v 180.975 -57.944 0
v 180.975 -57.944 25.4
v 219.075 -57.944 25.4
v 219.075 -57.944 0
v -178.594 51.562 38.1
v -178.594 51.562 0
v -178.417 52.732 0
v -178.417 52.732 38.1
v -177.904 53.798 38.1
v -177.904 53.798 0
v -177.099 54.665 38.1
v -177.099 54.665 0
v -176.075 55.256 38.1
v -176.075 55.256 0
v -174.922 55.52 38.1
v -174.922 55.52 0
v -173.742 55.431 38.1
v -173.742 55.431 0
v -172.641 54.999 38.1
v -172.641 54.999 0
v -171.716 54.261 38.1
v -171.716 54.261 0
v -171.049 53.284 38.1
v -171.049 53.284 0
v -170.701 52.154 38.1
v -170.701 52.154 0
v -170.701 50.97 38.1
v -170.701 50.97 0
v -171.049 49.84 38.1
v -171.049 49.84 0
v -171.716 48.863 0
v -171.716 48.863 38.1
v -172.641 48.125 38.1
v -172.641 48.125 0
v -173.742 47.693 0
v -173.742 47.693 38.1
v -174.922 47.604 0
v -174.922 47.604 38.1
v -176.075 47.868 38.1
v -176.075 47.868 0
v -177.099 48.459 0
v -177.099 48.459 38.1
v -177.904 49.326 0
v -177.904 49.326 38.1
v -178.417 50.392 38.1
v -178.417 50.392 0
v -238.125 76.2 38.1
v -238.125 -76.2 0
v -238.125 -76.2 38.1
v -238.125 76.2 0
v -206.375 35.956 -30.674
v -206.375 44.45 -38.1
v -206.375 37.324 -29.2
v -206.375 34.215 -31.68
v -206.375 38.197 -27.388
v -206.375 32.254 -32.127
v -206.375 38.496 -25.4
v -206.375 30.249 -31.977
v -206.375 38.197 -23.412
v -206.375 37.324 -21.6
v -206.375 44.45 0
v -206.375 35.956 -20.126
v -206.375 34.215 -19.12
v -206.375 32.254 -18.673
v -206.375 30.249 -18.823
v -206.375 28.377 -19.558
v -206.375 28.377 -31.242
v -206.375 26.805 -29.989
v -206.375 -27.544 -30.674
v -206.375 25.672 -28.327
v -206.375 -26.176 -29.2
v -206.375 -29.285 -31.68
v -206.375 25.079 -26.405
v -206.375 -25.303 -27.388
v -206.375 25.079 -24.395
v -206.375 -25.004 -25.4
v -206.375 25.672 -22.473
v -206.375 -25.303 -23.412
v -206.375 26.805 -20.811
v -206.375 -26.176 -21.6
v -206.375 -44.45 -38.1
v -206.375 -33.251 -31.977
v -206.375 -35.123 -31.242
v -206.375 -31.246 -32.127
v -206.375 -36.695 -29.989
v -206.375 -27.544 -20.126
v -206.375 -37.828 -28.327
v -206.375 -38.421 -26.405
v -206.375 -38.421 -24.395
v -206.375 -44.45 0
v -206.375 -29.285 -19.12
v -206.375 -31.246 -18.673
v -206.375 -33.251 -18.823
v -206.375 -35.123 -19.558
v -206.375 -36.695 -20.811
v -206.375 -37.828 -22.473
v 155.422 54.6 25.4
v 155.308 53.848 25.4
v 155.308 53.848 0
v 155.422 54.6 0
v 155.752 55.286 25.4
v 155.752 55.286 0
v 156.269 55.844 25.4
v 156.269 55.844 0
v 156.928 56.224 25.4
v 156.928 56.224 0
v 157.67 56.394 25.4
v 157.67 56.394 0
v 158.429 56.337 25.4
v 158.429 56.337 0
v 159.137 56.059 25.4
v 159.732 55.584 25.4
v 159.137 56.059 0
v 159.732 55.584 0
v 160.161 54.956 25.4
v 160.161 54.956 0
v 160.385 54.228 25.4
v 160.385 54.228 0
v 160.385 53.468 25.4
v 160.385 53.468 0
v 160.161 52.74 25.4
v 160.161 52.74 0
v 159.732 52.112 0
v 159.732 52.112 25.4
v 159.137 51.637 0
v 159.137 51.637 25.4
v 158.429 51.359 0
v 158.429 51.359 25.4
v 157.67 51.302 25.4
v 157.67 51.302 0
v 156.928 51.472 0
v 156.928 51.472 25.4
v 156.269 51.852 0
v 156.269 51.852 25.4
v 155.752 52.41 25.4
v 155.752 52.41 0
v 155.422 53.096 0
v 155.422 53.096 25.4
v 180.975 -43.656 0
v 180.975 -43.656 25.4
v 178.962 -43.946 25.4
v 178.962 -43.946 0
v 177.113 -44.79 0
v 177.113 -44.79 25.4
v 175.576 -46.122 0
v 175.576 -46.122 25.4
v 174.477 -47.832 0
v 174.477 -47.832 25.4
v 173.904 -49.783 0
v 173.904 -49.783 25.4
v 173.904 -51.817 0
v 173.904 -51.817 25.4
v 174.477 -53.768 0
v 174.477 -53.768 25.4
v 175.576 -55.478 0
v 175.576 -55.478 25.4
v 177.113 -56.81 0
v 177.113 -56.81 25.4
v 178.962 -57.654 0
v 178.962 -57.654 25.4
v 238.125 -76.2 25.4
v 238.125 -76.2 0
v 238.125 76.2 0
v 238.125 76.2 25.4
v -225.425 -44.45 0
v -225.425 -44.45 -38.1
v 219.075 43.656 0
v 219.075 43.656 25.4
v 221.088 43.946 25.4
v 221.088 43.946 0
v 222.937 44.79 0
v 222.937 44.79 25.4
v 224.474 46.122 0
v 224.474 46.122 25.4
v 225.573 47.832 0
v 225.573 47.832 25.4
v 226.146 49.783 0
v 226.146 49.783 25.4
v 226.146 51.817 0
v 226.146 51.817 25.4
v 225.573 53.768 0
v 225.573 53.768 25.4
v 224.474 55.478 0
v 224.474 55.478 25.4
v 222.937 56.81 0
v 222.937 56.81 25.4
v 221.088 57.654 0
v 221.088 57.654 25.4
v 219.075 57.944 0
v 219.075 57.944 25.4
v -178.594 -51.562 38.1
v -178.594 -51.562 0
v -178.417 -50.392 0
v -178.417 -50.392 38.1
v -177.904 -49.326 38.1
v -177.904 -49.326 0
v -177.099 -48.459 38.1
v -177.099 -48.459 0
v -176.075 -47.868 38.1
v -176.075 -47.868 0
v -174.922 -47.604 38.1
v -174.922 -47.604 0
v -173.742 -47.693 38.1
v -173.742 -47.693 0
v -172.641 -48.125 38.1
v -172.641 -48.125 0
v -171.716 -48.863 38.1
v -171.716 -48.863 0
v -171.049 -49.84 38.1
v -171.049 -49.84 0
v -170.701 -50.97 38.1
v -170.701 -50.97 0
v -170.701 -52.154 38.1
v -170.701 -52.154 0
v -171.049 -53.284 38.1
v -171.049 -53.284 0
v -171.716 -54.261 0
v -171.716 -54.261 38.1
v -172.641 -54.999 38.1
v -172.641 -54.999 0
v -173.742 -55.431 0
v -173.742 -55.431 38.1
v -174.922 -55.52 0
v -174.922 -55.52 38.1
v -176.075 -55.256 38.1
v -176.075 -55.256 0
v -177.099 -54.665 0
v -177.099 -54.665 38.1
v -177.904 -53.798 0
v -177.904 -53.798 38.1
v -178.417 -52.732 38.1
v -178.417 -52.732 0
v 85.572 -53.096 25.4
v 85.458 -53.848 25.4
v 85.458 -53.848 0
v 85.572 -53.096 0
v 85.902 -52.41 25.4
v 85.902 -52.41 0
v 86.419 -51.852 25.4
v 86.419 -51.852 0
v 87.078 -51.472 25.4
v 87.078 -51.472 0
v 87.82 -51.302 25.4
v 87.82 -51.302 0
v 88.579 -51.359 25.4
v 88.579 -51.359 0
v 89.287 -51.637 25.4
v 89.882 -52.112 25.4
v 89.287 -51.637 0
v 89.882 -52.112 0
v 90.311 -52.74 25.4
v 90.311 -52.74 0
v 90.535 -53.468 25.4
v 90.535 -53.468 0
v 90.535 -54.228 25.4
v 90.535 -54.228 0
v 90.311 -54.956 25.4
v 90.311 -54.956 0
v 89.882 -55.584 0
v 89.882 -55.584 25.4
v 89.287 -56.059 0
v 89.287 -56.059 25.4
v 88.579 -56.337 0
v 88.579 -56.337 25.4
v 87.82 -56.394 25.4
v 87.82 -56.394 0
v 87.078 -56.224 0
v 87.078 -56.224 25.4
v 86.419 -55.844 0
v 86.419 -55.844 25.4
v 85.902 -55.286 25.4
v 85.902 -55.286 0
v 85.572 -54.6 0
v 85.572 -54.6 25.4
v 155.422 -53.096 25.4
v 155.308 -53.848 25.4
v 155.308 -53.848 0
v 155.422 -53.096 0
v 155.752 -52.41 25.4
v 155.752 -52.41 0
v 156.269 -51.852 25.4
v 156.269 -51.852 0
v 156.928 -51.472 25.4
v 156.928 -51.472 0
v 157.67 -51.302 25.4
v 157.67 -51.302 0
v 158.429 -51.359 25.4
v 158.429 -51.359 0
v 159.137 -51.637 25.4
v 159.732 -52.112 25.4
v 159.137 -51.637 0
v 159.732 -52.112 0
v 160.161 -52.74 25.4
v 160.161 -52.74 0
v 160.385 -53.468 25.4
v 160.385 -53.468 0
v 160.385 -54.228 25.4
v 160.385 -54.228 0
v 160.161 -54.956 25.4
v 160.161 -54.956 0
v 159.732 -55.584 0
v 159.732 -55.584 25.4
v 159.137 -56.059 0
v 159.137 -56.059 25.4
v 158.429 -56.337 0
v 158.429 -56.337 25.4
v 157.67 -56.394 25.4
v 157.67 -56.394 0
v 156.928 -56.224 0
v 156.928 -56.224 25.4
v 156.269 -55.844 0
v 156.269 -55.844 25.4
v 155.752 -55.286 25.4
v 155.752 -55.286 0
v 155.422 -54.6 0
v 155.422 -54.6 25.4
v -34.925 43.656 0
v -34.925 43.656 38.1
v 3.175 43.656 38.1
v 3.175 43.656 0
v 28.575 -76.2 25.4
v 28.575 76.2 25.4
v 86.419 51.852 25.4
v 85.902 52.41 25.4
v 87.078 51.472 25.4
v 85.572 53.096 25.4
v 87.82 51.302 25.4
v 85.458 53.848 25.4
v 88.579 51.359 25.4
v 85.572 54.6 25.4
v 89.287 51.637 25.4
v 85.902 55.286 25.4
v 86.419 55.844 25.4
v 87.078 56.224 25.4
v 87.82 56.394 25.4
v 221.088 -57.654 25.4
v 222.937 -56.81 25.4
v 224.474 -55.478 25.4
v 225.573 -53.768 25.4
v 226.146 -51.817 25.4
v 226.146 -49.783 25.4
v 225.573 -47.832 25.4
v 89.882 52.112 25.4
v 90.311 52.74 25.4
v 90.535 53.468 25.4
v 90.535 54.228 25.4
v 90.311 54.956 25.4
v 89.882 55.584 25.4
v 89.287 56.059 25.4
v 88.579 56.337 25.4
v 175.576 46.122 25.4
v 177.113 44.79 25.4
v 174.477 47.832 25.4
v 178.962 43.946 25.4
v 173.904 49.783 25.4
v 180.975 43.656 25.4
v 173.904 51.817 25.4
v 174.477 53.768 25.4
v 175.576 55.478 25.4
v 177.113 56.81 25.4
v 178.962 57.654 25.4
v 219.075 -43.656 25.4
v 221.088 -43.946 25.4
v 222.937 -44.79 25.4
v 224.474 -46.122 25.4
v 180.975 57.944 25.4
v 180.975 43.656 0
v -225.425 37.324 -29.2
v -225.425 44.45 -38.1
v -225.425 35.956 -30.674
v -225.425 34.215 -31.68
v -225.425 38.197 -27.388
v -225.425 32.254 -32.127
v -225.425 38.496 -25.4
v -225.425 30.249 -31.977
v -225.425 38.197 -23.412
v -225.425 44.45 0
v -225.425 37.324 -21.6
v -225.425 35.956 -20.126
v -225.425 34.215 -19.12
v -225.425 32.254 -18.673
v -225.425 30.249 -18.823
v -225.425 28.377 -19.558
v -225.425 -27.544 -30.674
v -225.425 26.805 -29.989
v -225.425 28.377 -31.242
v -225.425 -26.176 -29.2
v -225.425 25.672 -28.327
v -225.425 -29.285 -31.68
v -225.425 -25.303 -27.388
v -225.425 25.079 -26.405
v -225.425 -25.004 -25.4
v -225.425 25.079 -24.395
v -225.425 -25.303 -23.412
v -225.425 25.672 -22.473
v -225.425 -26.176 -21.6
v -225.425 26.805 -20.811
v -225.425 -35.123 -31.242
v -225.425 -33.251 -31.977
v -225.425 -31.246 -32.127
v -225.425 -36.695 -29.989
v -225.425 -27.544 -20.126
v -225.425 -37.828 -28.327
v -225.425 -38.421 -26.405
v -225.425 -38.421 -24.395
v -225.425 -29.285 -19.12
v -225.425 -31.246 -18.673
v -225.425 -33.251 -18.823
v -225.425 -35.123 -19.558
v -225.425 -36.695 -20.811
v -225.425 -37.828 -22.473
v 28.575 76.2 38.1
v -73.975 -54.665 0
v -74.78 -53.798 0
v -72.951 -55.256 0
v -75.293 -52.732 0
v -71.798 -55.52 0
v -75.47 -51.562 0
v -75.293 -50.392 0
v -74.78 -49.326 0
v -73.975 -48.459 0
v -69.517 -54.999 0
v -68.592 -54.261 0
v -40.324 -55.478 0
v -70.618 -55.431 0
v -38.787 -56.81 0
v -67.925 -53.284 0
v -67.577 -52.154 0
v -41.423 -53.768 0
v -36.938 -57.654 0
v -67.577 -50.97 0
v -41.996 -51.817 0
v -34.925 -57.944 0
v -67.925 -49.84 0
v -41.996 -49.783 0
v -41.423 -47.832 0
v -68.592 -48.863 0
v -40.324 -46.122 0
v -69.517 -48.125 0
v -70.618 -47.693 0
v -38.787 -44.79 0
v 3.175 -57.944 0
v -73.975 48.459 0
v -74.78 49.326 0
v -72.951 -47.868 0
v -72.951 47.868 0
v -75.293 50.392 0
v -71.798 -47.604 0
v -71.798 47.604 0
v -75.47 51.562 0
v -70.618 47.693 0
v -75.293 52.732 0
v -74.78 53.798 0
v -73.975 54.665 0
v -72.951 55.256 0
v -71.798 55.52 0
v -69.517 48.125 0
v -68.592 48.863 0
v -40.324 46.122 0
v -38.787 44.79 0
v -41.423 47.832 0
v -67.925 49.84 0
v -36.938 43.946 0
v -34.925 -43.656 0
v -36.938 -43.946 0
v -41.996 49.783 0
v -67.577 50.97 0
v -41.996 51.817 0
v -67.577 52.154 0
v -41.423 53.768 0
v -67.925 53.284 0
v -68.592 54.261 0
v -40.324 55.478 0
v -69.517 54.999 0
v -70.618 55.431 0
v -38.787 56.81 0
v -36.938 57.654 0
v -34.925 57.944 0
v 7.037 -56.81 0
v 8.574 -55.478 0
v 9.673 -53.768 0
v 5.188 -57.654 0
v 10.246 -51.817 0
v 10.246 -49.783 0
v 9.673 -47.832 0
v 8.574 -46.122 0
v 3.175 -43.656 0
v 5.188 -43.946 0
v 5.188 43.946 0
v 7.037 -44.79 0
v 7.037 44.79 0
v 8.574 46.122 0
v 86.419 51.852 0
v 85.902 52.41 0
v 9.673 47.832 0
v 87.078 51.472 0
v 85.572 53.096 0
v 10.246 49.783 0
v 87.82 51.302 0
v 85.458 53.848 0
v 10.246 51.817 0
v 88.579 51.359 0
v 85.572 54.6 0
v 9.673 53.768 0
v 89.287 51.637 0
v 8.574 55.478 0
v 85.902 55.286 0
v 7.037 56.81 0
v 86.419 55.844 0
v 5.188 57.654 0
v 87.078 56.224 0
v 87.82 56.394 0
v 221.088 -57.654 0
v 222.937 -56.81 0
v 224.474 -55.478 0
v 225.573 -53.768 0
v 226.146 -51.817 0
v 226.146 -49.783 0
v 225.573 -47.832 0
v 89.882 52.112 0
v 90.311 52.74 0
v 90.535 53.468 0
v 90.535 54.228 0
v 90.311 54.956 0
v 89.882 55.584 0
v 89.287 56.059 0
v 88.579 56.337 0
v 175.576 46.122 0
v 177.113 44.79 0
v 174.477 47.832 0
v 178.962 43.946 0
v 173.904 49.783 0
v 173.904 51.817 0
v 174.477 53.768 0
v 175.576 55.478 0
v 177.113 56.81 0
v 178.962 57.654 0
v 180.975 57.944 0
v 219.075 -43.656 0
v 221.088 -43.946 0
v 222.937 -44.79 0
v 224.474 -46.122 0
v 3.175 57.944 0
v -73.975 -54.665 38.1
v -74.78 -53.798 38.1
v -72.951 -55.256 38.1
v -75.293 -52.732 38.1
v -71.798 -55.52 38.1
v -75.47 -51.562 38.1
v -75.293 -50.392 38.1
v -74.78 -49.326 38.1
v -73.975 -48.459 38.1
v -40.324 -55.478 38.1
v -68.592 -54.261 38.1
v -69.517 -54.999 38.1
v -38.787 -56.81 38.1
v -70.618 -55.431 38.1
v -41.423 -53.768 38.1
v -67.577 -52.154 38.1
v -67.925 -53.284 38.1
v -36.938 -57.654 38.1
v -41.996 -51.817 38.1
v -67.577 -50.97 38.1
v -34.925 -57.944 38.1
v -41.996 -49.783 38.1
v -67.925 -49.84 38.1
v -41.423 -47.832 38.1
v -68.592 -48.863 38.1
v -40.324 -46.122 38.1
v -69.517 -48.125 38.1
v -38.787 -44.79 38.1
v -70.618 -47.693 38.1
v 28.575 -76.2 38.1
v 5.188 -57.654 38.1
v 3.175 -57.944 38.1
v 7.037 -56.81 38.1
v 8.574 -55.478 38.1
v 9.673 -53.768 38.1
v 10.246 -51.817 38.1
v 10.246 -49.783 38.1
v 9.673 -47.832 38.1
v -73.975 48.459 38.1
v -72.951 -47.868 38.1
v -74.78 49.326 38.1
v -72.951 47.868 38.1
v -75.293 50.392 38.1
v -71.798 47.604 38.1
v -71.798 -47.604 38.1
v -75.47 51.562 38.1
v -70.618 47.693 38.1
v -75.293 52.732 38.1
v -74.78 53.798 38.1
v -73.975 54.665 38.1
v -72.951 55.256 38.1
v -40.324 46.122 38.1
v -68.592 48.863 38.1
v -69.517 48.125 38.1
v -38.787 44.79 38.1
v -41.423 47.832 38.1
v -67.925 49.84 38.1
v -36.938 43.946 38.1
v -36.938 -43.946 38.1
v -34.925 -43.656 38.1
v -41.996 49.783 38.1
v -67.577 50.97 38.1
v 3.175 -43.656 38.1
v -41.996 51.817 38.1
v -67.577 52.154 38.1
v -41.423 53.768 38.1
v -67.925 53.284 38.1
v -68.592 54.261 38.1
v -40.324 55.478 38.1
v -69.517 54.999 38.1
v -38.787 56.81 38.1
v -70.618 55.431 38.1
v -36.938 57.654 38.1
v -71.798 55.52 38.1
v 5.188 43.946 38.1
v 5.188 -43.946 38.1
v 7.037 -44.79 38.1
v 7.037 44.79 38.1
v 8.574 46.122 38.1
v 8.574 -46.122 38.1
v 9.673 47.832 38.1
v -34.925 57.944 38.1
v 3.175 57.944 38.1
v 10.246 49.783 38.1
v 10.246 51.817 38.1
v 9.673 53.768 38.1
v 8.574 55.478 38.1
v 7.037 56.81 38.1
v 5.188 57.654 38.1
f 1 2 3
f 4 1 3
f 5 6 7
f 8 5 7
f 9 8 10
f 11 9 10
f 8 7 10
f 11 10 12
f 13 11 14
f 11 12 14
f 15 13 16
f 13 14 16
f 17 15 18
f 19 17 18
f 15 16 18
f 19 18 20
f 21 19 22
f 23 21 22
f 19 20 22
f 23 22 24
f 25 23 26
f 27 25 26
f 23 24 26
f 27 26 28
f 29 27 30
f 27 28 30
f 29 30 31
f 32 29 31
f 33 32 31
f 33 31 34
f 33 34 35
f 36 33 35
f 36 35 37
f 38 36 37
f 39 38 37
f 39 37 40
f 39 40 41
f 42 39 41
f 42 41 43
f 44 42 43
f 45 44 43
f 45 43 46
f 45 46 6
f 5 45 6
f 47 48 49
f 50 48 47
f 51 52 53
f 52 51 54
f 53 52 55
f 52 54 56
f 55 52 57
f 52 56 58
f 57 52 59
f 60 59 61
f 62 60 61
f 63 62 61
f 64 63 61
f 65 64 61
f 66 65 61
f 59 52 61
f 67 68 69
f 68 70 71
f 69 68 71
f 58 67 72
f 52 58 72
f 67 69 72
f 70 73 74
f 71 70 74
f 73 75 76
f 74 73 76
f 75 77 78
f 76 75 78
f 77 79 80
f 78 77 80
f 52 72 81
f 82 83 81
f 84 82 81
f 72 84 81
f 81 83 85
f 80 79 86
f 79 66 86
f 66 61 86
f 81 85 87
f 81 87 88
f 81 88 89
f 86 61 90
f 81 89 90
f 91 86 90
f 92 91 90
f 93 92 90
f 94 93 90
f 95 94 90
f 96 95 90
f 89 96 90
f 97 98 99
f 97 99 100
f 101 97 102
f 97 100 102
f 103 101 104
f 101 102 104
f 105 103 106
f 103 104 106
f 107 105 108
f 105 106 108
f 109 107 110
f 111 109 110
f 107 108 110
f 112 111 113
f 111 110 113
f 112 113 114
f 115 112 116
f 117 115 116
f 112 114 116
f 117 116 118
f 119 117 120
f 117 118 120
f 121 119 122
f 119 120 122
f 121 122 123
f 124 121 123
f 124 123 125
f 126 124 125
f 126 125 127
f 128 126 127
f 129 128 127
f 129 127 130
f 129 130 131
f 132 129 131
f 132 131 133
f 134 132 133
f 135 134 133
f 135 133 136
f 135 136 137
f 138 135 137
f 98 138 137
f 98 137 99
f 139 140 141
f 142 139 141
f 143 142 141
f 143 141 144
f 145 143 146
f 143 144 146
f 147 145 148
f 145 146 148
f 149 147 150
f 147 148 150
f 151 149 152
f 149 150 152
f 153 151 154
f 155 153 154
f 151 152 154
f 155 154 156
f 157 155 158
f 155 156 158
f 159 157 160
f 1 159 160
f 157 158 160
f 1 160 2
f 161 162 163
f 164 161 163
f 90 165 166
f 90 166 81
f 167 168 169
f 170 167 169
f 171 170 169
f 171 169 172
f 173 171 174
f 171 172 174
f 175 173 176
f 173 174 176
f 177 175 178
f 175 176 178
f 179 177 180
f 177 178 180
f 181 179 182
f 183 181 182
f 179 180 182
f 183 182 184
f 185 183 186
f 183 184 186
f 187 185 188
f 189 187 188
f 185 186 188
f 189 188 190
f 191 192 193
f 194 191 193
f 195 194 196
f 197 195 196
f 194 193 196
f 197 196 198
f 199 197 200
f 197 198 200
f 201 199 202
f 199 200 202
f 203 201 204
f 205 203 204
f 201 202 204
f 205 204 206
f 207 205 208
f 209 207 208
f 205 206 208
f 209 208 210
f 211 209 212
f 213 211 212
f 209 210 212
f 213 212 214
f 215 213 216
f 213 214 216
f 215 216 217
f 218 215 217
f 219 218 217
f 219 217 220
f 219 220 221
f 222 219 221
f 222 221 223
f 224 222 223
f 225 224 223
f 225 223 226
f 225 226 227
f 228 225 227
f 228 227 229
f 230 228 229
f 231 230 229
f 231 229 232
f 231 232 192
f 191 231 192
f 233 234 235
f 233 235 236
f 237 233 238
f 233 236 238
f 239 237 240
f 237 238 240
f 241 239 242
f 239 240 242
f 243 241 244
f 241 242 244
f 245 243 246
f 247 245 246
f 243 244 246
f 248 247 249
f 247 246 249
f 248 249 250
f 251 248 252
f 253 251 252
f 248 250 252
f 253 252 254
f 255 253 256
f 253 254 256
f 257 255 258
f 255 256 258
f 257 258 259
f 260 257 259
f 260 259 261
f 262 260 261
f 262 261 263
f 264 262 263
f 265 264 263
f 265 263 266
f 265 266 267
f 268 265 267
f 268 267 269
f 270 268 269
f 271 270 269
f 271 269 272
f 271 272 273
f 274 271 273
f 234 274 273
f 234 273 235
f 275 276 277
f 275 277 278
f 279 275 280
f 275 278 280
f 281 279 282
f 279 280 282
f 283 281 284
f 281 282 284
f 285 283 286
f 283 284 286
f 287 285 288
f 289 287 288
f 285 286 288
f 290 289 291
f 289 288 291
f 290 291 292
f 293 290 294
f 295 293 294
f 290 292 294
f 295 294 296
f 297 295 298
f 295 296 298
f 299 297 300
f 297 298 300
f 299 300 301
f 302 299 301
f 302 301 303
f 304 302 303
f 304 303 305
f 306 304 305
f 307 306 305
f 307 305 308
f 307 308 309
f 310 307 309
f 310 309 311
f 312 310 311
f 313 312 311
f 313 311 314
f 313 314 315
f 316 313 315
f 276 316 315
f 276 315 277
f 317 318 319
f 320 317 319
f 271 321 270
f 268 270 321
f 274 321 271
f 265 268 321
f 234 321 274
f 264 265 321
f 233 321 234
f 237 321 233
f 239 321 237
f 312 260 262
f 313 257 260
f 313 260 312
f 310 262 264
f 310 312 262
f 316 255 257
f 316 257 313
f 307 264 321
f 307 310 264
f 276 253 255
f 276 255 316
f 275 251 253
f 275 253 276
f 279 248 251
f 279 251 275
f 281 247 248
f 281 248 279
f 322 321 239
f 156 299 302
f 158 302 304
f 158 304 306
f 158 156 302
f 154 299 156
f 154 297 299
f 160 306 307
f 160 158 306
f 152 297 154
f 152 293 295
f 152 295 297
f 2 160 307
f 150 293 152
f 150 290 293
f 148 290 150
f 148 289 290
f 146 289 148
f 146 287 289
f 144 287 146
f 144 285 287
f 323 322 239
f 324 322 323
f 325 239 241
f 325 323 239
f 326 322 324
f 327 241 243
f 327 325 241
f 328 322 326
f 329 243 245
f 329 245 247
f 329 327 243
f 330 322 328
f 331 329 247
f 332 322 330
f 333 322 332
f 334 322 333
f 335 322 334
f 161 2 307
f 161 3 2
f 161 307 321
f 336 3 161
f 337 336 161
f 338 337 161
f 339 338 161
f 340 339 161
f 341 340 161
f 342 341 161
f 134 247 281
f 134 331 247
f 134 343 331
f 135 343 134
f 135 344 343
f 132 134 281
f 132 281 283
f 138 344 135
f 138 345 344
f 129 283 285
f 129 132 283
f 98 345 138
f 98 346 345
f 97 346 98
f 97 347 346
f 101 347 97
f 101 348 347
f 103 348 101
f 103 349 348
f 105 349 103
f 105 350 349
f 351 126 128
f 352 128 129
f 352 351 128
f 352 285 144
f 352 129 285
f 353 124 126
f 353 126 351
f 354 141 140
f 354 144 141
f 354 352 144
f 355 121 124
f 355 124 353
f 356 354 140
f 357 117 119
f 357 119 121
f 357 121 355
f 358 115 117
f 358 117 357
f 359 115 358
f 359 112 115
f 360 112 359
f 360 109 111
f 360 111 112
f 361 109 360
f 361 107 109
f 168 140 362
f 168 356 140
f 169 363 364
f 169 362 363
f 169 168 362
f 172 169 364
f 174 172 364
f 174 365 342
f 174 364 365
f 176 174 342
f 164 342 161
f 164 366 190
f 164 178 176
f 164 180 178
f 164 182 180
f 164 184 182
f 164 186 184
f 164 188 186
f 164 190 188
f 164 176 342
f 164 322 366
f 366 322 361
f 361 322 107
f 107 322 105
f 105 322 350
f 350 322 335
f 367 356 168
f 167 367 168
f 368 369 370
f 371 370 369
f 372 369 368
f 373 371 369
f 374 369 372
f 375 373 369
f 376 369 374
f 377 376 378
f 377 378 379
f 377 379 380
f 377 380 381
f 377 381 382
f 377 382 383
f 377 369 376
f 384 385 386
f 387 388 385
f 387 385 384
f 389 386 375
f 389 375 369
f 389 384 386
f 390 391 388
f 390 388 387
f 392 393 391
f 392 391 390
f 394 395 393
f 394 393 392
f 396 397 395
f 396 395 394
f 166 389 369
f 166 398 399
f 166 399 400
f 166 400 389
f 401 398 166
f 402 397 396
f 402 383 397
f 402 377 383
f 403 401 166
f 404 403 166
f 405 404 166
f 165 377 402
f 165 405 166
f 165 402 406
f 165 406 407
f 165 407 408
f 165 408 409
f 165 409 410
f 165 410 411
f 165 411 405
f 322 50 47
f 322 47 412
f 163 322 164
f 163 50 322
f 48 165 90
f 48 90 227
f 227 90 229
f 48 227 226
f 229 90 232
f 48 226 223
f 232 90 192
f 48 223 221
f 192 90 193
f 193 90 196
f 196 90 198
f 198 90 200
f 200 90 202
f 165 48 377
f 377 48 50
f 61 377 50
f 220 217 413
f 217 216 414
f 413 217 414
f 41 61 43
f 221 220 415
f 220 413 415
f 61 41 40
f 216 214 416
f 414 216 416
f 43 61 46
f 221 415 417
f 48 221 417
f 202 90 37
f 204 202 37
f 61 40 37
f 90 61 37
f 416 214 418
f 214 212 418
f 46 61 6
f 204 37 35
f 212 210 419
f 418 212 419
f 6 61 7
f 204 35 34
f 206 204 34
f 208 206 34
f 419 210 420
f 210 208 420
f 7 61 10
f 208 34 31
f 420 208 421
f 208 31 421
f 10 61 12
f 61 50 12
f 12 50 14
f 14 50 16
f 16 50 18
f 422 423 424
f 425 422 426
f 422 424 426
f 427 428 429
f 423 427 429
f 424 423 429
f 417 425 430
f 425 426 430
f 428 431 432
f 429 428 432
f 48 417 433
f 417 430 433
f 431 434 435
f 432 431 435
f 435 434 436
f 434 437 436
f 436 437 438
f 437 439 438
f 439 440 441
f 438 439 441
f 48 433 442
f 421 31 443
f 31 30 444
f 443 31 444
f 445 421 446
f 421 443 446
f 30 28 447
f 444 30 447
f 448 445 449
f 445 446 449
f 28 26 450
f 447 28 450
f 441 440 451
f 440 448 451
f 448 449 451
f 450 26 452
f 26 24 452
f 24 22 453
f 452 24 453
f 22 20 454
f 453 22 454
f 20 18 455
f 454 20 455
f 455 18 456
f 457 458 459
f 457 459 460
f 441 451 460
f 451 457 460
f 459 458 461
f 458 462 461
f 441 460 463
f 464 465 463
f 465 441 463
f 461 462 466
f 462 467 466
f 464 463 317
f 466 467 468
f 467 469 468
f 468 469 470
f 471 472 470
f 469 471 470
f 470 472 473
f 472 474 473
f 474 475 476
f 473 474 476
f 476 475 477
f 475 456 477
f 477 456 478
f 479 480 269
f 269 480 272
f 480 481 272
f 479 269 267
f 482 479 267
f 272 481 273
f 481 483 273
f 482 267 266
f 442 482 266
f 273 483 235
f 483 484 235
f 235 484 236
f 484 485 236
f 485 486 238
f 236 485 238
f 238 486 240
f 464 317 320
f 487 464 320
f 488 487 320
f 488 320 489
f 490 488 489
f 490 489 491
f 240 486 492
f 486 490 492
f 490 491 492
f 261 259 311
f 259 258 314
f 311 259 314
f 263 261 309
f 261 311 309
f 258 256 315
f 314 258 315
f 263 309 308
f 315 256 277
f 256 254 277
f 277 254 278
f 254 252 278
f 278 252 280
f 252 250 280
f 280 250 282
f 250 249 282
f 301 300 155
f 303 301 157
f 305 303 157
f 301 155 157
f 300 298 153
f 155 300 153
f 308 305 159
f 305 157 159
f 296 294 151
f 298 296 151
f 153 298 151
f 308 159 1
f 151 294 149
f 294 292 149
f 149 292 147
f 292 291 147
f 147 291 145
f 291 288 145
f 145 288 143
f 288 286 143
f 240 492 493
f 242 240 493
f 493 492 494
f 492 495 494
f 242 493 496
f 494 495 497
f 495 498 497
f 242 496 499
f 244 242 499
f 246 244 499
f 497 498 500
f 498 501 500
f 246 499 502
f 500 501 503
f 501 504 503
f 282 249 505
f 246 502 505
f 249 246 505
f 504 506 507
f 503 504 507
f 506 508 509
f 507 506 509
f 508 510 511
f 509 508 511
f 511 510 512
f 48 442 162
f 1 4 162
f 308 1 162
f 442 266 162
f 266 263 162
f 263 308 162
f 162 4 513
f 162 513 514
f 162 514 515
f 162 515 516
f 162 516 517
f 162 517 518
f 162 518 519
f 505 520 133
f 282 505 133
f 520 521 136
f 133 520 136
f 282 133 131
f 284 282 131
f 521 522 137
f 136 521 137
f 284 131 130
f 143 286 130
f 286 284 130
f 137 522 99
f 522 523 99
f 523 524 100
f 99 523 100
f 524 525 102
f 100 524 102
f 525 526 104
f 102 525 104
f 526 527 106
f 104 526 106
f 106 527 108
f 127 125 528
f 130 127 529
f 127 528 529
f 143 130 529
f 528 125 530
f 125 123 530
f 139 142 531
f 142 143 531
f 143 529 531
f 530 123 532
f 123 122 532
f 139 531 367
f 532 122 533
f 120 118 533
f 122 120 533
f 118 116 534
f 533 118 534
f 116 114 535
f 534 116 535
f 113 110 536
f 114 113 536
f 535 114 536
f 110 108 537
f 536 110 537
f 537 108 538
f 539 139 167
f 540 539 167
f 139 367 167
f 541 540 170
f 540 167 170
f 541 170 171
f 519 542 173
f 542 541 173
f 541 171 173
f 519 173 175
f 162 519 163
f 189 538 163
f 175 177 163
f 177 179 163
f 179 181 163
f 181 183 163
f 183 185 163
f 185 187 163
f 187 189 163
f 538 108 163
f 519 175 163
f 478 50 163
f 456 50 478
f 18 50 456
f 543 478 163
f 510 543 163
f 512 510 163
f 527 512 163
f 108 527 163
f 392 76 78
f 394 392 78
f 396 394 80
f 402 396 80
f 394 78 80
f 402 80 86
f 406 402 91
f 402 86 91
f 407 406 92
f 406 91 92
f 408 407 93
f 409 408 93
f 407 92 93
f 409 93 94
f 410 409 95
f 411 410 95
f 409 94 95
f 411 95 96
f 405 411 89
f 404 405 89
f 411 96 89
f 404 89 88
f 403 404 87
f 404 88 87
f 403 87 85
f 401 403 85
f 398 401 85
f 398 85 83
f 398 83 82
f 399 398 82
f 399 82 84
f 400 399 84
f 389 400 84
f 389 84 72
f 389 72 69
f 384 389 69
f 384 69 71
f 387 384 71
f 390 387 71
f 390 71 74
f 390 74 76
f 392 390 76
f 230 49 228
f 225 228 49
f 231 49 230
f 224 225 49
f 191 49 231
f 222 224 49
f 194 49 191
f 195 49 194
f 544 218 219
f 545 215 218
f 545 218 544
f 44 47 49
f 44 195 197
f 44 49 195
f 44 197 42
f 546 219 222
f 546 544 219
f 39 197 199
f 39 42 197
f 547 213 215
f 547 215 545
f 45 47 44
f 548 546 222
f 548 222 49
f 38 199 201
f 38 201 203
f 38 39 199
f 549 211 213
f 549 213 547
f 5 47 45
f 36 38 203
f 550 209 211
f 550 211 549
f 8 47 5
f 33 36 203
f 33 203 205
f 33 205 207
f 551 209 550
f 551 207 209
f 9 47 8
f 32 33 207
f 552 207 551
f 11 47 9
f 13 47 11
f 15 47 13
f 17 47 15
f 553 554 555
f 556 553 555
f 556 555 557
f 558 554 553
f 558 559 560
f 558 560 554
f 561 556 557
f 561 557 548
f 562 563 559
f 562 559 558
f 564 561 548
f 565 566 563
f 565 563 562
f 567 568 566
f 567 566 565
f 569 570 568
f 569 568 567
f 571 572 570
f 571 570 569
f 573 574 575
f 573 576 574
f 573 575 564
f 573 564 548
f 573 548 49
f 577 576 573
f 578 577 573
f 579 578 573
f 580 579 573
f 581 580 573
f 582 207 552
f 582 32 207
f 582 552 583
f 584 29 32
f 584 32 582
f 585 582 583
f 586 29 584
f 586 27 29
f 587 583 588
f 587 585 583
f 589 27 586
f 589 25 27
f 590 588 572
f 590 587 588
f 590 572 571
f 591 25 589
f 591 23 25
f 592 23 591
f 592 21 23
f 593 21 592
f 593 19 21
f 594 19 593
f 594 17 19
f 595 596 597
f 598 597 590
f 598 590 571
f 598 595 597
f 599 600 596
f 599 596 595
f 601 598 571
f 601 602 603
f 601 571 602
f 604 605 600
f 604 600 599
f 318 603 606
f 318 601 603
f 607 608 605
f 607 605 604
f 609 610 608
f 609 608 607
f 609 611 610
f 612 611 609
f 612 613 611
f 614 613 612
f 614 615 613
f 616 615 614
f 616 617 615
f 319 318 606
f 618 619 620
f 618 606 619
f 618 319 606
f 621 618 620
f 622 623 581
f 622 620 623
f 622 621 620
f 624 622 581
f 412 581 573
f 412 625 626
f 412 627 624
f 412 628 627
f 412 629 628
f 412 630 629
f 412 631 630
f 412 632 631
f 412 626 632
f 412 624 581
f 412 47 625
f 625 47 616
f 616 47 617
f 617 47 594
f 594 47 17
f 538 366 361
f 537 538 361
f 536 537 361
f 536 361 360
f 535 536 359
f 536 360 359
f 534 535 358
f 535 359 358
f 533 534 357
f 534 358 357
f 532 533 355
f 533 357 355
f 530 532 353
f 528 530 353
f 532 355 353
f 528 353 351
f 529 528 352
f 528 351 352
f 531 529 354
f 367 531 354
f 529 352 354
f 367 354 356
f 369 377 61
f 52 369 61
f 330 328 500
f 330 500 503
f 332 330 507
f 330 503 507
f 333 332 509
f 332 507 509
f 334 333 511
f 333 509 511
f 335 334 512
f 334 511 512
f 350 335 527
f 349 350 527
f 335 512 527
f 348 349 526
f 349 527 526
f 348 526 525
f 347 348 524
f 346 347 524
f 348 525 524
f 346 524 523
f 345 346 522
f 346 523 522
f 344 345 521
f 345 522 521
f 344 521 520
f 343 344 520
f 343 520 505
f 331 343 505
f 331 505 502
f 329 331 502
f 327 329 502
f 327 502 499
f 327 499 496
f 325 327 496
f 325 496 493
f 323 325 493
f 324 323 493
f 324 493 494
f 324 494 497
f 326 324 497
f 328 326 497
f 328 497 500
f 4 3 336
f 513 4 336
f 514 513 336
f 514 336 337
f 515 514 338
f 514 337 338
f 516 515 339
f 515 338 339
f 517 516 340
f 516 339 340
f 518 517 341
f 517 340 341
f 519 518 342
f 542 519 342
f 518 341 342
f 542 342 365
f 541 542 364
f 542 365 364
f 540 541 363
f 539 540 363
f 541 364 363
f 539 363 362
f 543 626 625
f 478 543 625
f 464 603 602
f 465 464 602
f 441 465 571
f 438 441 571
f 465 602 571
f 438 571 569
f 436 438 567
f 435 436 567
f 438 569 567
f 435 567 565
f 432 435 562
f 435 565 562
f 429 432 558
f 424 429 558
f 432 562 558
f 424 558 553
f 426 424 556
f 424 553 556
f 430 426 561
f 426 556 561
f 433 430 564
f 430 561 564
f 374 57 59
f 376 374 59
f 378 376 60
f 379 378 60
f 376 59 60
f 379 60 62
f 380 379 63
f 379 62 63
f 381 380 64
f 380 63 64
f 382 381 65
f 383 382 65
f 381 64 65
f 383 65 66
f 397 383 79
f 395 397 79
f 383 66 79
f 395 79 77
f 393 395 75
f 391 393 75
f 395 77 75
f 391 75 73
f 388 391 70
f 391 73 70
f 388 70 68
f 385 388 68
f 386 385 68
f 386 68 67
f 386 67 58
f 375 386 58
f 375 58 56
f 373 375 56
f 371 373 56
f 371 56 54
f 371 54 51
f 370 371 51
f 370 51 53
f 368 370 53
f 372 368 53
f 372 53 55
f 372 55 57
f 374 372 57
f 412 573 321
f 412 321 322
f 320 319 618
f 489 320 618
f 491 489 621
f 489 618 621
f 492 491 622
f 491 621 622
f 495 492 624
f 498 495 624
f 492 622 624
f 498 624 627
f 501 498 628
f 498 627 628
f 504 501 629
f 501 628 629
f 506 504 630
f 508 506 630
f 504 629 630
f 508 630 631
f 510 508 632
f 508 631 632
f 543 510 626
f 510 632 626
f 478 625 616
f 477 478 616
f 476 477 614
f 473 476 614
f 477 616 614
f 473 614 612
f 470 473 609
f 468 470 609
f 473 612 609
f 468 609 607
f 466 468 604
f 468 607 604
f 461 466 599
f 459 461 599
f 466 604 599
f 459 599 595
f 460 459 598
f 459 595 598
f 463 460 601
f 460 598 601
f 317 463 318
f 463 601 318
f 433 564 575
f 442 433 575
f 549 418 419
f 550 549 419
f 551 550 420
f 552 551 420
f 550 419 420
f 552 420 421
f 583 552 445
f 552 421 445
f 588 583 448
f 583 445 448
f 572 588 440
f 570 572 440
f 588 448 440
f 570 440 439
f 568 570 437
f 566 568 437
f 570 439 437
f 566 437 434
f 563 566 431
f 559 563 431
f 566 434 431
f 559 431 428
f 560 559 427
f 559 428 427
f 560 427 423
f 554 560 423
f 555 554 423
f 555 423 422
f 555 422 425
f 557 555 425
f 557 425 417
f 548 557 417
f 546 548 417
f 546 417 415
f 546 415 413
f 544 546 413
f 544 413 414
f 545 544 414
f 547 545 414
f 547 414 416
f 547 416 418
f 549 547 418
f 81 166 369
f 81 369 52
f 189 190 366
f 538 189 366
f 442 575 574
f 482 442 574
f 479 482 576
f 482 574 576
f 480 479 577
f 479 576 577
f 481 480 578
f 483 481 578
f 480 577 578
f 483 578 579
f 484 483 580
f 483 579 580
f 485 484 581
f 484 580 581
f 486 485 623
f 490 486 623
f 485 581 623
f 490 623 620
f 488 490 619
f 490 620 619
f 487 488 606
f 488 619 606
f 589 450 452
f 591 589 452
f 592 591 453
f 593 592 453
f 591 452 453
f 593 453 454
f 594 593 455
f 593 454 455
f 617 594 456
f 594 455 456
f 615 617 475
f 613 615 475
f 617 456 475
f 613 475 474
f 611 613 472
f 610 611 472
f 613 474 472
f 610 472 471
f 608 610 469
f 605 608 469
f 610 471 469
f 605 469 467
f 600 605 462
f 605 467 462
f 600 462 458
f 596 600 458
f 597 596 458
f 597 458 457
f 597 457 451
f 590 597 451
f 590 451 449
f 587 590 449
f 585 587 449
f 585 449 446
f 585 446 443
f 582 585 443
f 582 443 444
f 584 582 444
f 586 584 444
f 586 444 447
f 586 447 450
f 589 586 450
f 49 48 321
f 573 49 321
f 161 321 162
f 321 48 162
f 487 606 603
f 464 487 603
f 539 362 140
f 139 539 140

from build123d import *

# Parameters (mm, degrees)
F0_W      = 476.25
F0_H      = 152.4
F1_DEPTH  = 38.1
F2_W      = 209.55
F2_H      = 152.4
F3_DEPTH  = 12.7
F5_DEPTH  = 38.101
F7_D      = 7.9375
F8_D      = 5.1054
F9_W      = 19.05
F9_H      = 88.9
F10_DEPTH = 38.1
F12_D     = 13.49248


with BuildPart() as f1:
    # F0 (on Top) → F1 (new body)
    with BuildSketch(Plane.XY):
        Rectangle(F0_W, F0_H)
    extrude(amount=F1_DEPTH)

    # F2 (on face) → F3 (cut)
    with BuildSketch(Plane.XY.offset(38.1)):
        with Locations((133.35, 0)):
            Rectangle(F2_W, F2_H)
    extrude(amount=-F3_DEPTH, mode=Mode.SUBTRACT)

    # F4 (on face) → F5 (cut, through all)
    with BuildSketch(Plane.XY.offset(38.1)):
        with BuildLine():
            Line((3.175, -43.65625), (-34.925, -43.65625))
            ThreePointArc((-34.925, -43.65625), (-42.06875, -50.8), (-34.925, -57.94375))
            Line((-34.925, -57.94375), (3.175, -57.94375))
            ThreePointArc((3.175, -57.94375), (10.31875, -50.8), (3.175, -43.65625))
        make_face()
        with BuildLine():
            Line((219.075, -43.65625), (180.975, -43.65625))
            ThreePointArc((180.975, -43.65625), (173.83125, -50.8), (180.975, -57.94375))
            Line((180.975, -57.94375), (219.075, -57.94375))
            ThreePointArc((219.075, -57.94375), (226.21875, -50.8), (219.075, -43.65625))
        make_face()
        with BuildLine():
            ThreePointArc((-34.925, 57.94375), (-42.06875, 50.8), (-34.925, 43.65625))
            Line((-34.925, 43.65625), (3.175, 43.65625))
            ThreePointArc((3.175, 43.65625), (10.31875, 50.8), (3.175, 57.94375))
            Line((3.175, 57.94375), (-34.925, 57.94375))
        make_face()
        with BuildLine():
            ThreePointArc((180.975, 57.94375), (173.83125, 50.8), (180.975, 43.65625))
            Line((180.975, 43.65625), (219.075, 43.65625))
            ThreePointArc((219.075, 43.65625), (226.21875, 50.8), (219.075, 57.94375))
            Line((219.075, 57.94375), (180.975, 57.94375))
        make_face()
    extrude(amount=-F5_DEPTH, mode=Mode.SUBTRACT)

    # F7 (through all)
    with Locations(Plane.XY.offset(38.1)):
        with Locations((-174.625, 51.562), (-71.501, 51.562), (-174.625, -51.562), (-71.501, -51.562)):
            Hole(F7_D / 2)

    # F8 (through all)
    with Locations(Plane.XY.offset(38.1)):
        with Locations((88.011, 53.848), (157.861, 53.848), (88.011, -53.848), (157.861, -53.848)):
            Hole(F8_D / 2)

    # F9 (on face) → F10 (join)
    with BuildSketch(Plane(origin=(0, 0, 0), x_dir=(1, 0, 0), z_dir=(0, 0, -1))):
        with Locations((-215.9, 0)):
            Rectangle(F9_W, F9_H)
    extrude(amount=F10_DEPTH)

    # F12 (through all)
    with Locations(Plane(origin=(-225.425, 0, 0), x_dir=(0, -1, 0), z_dir=(-1, 0, 0))):
        with Locations((-31.75, -25.4), (31.75, -25.4)):
            Hole(F12_D / 2)


solid = f1.part
